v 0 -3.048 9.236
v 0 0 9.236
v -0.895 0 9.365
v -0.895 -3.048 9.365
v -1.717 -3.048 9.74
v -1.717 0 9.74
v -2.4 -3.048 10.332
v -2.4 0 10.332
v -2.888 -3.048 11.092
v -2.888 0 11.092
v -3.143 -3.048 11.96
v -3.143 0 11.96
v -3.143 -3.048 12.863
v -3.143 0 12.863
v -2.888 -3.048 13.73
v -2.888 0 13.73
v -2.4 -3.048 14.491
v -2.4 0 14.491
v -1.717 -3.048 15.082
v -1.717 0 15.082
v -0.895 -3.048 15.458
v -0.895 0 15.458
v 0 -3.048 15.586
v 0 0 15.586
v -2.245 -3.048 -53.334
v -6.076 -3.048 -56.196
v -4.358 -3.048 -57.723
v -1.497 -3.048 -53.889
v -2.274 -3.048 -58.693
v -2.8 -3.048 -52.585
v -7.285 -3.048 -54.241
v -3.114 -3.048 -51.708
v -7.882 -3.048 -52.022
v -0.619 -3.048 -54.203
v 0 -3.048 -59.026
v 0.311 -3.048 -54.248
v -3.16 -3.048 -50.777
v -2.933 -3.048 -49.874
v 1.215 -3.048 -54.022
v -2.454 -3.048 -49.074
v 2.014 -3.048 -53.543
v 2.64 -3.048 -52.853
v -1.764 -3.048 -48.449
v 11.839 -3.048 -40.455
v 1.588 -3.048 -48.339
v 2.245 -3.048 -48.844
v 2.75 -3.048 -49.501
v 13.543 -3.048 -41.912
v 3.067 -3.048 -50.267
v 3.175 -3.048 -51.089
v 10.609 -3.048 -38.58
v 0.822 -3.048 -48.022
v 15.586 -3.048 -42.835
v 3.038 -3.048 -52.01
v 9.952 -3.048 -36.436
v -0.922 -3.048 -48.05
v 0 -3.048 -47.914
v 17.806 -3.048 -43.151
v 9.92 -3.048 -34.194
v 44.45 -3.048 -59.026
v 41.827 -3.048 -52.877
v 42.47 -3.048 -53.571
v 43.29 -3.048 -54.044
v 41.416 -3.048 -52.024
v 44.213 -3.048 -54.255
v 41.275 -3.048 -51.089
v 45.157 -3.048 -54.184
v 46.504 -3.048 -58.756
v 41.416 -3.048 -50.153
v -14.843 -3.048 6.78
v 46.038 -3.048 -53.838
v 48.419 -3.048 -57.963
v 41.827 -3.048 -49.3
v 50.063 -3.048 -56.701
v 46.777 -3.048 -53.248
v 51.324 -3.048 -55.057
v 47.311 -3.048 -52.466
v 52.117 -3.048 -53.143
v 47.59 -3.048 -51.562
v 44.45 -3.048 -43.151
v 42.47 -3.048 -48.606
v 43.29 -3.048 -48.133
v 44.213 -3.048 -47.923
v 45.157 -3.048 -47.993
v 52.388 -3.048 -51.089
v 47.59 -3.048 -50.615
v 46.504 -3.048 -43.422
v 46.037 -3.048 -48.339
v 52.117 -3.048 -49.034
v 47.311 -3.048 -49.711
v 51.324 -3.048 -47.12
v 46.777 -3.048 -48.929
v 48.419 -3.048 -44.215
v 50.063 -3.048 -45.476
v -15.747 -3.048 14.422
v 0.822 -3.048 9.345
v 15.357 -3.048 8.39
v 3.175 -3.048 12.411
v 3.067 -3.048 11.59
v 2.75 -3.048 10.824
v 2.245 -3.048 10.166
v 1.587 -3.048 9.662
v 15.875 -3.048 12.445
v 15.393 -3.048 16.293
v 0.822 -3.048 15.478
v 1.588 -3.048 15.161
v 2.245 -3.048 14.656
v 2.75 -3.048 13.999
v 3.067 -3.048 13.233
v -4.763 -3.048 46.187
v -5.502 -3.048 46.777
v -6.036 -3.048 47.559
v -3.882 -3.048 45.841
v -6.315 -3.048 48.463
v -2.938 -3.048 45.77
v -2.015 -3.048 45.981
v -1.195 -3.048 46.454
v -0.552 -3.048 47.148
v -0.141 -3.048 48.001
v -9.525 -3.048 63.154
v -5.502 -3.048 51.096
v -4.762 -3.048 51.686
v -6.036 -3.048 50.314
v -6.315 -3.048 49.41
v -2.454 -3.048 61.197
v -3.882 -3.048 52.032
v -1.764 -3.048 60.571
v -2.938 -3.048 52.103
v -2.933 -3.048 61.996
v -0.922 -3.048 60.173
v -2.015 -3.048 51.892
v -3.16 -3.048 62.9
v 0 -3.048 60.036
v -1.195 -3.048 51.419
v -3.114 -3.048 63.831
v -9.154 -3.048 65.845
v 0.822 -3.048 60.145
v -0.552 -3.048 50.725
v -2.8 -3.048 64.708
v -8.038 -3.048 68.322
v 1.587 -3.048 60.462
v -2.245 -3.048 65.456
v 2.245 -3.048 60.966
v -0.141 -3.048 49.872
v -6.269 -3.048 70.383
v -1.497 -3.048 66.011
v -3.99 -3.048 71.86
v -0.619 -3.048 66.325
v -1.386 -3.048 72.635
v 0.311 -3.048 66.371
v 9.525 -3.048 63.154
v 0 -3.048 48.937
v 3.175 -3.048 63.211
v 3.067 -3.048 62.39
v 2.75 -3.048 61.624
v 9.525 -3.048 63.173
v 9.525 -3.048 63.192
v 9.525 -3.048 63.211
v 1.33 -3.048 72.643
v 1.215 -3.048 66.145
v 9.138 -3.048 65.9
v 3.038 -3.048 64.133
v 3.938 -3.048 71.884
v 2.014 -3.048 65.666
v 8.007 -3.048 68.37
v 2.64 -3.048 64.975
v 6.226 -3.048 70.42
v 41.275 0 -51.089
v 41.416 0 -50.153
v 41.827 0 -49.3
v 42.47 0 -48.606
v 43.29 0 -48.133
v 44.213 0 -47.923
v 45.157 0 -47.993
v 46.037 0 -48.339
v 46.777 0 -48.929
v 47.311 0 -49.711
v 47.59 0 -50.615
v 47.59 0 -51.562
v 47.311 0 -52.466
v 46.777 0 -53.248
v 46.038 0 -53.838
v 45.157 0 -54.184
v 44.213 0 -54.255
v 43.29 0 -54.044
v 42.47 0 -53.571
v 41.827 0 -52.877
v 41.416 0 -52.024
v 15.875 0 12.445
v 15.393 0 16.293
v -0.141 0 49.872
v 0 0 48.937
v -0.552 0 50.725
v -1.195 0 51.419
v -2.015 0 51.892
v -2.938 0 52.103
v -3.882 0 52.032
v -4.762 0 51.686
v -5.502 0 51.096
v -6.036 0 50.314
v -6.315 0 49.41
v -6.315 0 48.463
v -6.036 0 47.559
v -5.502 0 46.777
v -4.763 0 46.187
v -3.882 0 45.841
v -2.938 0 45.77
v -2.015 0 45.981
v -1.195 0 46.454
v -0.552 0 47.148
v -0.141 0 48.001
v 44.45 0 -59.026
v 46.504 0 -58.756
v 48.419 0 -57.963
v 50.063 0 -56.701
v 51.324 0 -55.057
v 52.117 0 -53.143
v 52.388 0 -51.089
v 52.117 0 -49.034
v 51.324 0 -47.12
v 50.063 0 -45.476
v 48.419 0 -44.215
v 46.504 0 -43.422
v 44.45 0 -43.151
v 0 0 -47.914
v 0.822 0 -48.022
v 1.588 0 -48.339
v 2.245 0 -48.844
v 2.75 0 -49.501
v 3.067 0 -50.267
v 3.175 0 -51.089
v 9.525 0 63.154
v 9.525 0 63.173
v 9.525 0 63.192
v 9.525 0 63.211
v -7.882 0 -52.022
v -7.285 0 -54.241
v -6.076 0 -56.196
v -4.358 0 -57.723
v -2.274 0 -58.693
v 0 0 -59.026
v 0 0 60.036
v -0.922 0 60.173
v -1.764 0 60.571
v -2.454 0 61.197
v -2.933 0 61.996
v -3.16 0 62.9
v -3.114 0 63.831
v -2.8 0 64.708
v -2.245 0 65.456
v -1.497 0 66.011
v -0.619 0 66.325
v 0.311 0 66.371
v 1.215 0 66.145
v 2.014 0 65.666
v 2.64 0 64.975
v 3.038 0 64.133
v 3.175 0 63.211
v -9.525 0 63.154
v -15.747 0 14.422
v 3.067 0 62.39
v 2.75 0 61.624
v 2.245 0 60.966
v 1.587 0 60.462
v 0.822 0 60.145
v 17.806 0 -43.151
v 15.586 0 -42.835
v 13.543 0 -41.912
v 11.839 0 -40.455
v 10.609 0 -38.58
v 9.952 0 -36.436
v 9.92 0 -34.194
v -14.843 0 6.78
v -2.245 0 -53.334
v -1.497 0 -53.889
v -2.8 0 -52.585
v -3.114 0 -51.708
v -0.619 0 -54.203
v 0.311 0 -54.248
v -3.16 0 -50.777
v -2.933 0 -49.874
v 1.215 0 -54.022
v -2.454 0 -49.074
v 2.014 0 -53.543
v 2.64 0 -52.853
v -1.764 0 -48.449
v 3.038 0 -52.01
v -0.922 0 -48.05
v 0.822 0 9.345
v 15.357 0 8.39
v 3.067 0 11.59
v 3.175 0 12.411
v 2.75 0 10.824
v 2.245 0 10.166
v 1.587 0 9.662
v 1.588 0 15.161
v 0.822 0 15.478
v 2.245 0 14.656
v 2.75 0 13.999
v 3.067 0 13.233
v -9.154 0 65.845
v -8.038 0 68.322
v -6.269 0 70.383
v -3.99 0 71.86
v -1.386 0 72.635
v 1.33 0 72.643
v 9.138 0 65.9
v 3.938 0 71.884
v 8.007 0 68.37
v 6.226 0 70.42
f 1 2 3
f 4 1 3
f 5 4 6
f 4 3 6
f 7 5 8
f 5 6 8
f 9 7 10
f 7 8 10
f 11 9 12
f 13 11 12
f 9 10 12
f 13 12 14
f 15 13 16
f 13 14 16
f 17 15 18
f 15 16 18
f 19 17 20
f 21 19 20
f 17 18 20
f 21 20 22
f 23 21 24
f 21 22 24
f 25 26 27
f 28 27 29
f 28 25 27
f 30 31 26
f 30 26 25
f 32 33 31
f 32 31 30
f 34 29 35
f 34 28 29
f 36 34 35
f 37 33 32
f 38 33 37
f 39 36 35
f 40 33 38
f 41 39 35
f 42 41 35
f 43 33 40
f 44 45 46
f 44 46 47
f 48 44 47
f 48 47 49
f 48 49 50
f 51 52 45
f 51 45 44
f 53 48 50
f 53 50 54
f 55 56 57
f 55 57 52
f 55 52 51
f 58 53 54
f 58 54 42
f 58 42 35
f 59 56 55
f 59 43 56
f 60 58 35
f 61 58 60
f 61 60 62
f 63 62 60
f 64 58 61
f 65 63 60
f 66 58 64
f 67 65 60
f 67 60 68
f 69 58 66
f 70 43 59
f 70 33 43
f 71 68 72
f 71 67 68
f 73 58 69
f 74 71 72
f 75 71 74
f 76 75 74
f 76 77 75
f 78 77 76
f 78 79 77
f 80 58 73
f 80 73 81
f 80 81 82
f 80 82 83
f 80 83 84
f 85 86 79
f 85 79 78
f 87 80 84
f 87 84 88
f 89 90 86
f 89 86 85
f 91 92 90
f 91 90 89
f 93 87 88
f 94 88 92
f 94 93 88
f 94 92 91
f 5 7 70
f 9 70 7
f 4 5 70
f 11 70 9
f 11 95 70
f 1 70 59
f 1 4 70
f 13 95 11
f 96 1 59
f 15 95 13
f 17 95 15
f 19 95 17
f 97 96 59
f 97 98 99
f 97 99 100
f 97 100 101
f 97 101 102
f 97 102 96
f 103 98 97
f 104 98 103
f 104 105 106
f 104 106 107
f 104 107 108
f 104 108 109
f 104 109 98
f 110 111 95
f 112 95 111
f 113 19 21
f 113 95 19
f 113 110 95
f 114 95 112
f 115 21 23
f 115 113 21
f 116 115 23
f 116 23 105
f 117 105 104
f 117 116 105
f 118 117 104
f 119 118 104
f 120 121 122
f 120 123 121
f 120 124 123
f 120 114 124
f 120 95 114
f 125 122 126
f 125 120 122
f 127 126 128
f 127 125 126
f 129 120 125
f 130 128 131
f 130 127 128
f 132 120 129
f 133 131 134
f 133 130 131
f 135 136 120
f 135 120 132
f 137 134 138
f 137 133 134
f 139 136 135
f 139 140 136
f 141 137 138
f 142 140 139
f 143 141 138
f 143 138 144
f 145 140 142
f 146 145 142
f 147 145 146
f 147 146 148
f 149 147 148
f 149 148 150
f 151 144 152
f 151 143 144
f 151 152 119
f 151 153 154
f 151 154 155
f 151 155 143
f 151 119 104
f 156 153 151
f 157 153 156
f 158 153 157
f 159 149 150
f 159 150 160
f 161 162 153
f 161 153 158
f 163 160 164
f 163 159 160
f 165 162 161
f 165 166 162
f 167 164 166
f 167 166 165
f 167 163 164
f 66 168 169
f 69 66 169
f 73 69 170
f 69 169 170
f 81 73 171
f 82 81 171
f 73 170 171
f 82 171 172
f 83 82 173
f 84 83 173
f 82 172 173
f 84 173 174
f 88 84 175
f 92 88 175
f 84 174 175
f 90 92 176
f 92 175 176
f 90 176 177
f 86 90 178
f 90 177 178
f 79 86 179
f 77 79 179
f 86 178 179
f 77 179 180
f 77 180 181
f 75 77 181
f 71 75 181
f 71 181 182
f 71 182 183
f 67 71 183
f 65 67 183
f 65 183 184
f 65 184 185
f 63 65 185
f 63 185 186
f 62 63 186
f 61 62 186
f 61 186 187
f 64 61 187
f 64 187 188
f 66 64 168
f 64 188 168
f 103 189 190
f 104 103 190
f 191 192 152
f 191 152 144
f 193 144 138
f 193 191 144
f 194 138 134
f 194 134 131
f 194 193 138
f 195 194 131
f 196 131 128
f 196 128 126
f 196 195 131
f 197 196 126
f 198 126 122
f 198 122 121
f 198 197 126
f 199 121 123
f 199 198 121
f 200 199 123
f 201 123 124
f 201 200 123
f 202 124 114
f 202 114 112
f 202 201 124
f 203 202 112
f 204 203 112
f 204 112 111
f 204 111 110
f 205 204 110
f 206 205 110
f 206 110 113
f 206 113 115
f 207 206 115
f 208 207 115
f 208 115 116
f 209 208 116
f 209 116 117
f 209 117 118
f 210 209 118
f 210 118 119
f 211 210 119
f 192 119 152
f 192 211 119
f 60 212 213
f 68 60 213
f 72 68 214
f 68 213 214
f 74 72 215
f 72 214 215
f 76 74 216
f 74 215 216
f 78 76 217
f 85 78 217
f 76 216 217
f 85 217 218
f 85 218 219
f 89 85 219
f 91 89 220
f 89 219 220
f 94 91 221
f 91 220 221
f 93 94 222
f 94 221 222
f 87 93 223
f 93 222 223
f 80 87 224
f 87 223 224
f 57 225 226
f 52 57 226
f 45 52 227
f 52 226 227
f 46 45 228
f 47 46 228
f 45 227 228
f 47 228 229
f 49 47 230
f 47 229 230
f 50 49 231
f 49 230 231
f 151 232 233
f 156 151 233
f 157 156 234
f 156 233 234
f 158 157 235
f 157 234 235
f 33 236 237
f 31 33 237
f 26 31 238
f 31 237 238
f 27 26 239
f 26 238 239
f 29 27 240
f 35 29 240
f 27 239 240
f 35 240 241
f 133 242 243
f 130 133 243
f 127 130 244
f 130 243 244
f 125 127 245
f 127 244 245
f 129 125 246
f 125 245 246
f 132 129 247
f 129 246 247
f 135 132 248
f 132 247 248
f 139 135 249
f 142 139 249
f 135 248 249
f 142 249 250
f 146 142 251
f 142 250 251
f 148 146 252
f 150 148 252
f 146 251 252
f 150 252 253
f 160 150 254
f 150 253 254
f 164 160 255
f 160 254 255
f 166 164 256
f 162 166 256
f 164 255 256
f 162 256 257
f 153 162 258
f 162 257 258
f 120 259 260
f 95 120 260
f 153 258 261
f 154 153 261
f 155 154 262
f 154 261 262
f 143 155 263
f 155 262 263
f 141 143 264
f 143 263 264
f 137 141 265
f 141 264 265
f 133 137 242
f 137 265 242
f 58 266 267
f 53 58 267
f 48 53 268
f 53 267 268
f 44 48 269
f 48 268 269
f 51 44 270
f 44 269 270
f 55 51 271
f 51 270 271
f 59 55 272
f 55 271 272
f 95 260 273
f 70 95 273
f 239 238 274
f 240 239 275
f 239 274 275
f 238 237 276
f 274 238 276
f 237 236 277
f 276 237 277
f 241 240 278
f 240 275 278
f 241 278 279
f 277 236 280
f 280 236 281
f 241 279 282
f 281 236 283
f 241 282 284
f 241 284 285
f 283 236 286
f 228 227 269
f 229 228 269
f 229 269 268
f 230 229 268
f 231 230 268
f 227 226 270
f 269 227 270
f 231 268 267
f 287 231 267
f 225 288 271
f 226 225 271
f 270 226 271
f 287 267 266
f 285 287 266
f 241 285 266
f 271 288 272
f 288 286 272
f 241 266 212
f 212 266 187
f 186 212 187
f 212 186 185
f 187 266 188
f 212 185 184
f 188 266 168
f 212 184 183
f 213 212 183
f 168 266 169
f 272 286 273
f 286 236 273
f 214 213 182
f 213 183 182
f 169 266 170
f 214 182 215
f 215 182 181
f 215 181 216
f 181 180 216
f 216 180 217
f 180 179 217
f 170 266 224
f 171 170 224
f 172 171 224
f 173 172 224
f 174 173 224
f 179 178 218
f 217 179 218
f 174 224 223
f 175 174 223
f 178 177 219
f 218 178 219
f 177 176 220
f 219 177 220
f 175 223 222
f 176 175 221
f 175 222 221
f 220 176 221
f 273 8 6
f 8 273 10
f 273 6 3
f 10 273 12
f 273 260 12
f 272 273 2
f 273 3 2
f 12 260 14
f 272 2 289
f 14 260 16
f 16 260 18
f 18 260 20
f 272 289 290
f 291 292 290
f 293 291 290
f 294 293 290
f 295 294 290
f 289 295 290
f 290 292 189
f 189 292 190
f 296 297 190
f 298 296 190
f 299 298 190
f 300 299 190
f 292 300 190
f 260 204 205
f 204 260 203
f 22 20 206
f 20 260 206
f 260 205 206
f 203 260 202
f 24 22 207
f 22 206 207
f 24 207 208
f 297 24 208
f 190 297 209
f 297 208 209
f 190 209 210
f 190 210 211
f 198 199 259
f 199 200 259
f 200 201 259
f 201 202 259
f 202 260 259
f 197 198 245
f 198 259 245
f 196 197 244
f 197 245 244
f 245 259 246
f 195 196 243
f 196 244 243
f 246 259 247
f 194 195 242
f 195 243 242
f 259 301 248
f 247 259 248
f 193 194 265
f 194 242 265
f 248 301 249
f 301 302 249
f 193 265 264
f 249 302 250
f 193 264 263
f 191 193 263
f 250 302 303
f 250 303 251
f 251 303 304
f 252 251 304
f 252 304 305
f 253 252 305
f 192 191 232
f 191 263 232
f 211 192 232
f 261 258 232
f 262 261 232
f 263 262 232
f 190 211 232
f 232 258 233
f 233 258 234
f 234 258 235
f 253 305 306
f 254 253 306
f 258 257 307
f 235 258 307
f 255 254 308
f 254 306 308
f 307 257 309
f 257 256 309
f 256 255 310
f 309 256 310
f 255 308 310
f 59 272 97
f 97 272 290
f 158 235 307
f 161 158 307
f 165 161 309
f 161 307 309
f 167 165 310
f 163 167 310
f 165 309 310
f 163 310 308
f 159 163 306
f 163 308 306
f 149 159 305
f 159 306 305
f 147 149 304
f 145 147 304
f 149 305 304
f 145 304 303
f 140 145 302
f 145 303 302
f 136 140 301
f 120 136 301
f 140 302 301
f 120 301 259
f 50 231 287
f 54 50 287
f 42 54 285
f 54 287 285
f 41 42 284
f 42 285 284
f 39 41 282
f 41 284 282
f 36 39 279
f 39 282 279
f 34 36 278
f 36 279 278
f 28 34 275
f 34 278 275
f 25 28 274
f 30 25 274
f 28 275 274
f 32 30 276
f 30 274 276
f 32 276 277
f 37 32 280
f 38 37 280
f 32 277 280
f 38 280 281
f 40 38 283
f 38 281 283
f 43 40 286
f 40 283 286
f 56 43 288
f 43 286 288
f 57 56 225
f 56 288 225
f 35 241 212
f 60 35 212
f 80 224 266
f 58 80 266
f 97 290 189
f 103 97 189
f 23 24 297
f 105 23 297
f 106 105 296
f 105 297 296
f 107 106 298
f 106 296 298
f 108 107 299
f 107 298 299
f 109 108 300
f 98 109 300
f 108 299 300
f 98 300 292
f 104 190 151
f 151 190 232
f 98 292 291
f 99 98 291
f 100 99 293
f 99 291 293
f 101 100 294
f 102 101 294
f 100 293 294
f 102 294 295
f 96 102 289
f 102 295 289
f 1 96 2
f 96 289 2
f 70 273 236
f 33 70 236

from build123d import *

# Parameters (mm, degrees)
F0_R     = 3.175
F1_DEPTH = 3.048


# Not quite as in the source:
# - a feature names something its author has since deleted; it is built from what else it names


with BuildPart() as f1:
    # F0 (on Front) → F1 (new body)
    with BuildSketch(Plane.XZ):
        with BuildLine():
            ThreePointArc((-9.524828548, 63.1542134468), (-6.7149560856, 56.455996051), (0, 53.6863635294))
            ThreePointArc((0, 53.6863635294), (6.7149544249, 56.4559944002), (9.5248285199, 63.1542087637))
            ThreePointArc((9.5248285199, 63.1542087637), (9.5249571299, 63.1827860179), (9.525, 63.2113635294))
            ThreePointArc((9.525, 63.2113635294), (-0.0285751699, 72.7363206663), (-9.524828548, 63.1542134468))
        make_face()
        with BuildLine():
            ThreePointArc((3.175, 63.2113635294), (2.2450640303, 60.9662994992), (0, 60.0363635294))
            ThreePointArc((0, 60.0363635294), (-2.2450640303, 65.4564275597), (3.175, 63.2113635294))
        make_face(mode=Mode.SUBTRACT)
        with BuildLine():
            ThreePointArc((9.5248285199, 63.1542087637), (6.7149544249, 56.4559944002), (0, 53.6863635294))
            Line((0, 53.6863635294), (0, 48.9365635294))
            Line((0, 48.9365635294), (0, 28.2863635294))
            ThreePointArc((0, 28.2863635294), (9.7569068314, 24.9340786537), (15.3931294165, 16.2930116029))
            Line((15.3931294165, 16.2930116029), (9.5248285199, 63.1542087637))
        make_face()
        with BuildLine():
            Line((0, 48.9365635294), (0, 53.6863635294))
            ThreePointArc((0, 53.6863635294), (-6.7149560856, 56.455996051), (-9.524828548, 63.1542134468))
            Line((-9.524828548, 63.1542134468), (-15.7471542329, 14.4220247552))
            ThreePointArc((-15.7471542329, 14.4220247552), (-10.4903855516, 24.3263723829), (0, 28.2863635294))
            Line((0, 28.2863635294), (0, 48.9365635294))
        make_face()
        with Locations((-3.175, 48.9365635294)):
            Circle(F0_R, mode=Mode.SUBTRACT)
        with BuildLine():
            ThreePointArc((15.3931294165, 16.2930116029), (9.7569068314, 24.9340786537), (0, 28.2863635294))
            Line((0, 28.2863635294), (0, 15.5863635294))
            ThreePointArc((0, 15.5863635294), (2.2450640303, 14.6564275597), (3.175, 12.4113635294))
            ThreePointArc((3.175, 12.4113635294), (2.2450640303, 10.1662994992), (0, 9.2363635294))
            Line((0, 9.2363635294), (0, -3.4636364706))
            ThreePointArc((0, -3.4636364706), (9.6997269009, -0.1556935265), (15.3571050572, 8.3895543266))
            Line((15.3571050572, 8.3895543266), (15.8749636535, 12.445334128))
            Line((15.8749636535, 12.445334128), (15.3931294165, 16.2930116029))
        make_face()
        with BuildLine():
            Line((0, 15.5863635294), (0, 28.2863635294))
            ThreePointArc((0, 28.2863635294), (-10.4903855516, 24.3263723829), (-15.7471542329, 14.4220247552))
            Line((-15.7471542329, 14.4220247552), (-14.8425870633, 6.7799130706))
            ThreePointArc((-14.8425870633, 6.7799130706), (-9.017104551, -0.6541426038), (0, -3.4636364706))
            Line((0, -3.4636364706), (0, 9.2363635294))
            ThreePointArc((0, 9.2363635294), (-3.175, 12.4113635294), (0, 15.5863635294))
        make_face()
        with BuildLine():
            ThreePointArc((0, -3.4636364706), (-9.017104551, -0.6541426038), (-14.8425870633, 6.7799130706))
            Line((-14.8425870633, 6.7799130706), (-7.8824732142, -52.0216543038))
            ThreePointArc((-7.8824732142, -52.0216543038), (-5.9333689967, -45.8161571108), (0, -43.1511364706))
            Line((0, -43.1511364706), (0, -3.4636364706))
        make_face()
        with BuildLine():
            ThreePointArc((15.3571050572, 8.3895543266), (9.6997269009, -0.1556935265), (0, -3.4636364706))
            Line((0, -3.4636364706), (0, -43.1511364706))
            ThreePointArc((0, -43.1511364706), (5.6126600757, -45.4759763949), (7.9375, -51.0886364706))
            Line((7.9375, -51.0886364706), (36.5125, -51.0886364706))
            ThreePointArc((36.5125, -51.0886364706), (38.8373399243, -45.4759763949), (44.45, -43.1511364706))
            Line((44.45, -43.1511364706), (17.8060374021, -43.1511364706))
            ThreePointArc((17.8060374021, -43.1511364706), (11.8390009683, -40.4545215548), (9.9198625623, -34.1939973287))
            Line((9.9198625623, -34.1939973287), (15.3571050572, 8.3895543266))
        make_face()
        with BuildLine():
            ThreePointArc((0, -43.1511364706), (-5.9333689967, -45.8161571108), (-7.8824732142, -52.0216543038))
            ThreePointArc((-7.8824732142, -52.0216543038), (-5.2724793598, -57.0220054673), (0, -59.0261364706))
            ThreePointArc((0, -59.0261364706), (5.6126600757, -56.7012965462), (7.9375, -51.0886364706))
            Line((7.9375, -51.0886364706), (3.175, -51.0886364706))
            ThreePointArc((3.175, -51.0886364706), (-2.2450640303, -53.3337005008), (0, -47.9136364706))
            Line((0, -47.9136364706), (0, -43.1511364706))
        make_face()
        with BuildLine():
            ThreePointArc((7.9375, -51.0886364706), (5.6126600757, -45.4759763949), (0, -43.1511364706))
            Line((0, -43.1511364706), (0, -47.9136364706))
            ThreePointArc((0, -47.9136364706), (2.2450640303, -48.8435724403), (3.175, -51.0886364706))
            Line((3.175, -51.0886364706), (7.9375, -51.0886364706))
        make_face()
        with BuildLine():
            ThreePointArc((7.9375, -51.0886364706), (5.6126600757, -56.7012965462), (0, -59.0261364706))
            Line((0, -59.0261364706), (44.45, -59.0261364706))
            ThreePointArc((44.45, -59.0261364706), (38.8373399243, -56.7012965462), (36.5125, -51.0886364706))
            Line((36.5125, -51.0886364706), (7.9375, -51.0886364706))
        make_face()
        with BuildLine():
            ThreePointArc((36.5125, -51.0886364706), (38.8373399243, -56.7012965462), (44.45, -59.0261364706))
            ThreePointArc((44.45, -59.0261364706), (50.0626600757, -56.7012965462), (52.3875, -51.0886364706))
            ThreePointArc((52.3875, -51.0886364706), (50.0626600757, -45.4759763949), (44.45, -43.1511364706))
            ThreePointArc((44.45, -43.1511364706), (38.8373399243, -45.4759763949), (36.5125, -51.0886364706))
        make_face()
        with BuildLine():
            ThreePointArc((47.625, -51.0886364706), (44.45, -54.2636364706), (41.275, -51.0886364706))
            ThreePointArc((41.275, -51.0886364706), (44.45, -47.9136364706), (47.625, -51.0886364706))
        make_face(mode=Mode.SUBTRACT)
    extrude(amount=F1_DEPTH)


solid = f1.part
